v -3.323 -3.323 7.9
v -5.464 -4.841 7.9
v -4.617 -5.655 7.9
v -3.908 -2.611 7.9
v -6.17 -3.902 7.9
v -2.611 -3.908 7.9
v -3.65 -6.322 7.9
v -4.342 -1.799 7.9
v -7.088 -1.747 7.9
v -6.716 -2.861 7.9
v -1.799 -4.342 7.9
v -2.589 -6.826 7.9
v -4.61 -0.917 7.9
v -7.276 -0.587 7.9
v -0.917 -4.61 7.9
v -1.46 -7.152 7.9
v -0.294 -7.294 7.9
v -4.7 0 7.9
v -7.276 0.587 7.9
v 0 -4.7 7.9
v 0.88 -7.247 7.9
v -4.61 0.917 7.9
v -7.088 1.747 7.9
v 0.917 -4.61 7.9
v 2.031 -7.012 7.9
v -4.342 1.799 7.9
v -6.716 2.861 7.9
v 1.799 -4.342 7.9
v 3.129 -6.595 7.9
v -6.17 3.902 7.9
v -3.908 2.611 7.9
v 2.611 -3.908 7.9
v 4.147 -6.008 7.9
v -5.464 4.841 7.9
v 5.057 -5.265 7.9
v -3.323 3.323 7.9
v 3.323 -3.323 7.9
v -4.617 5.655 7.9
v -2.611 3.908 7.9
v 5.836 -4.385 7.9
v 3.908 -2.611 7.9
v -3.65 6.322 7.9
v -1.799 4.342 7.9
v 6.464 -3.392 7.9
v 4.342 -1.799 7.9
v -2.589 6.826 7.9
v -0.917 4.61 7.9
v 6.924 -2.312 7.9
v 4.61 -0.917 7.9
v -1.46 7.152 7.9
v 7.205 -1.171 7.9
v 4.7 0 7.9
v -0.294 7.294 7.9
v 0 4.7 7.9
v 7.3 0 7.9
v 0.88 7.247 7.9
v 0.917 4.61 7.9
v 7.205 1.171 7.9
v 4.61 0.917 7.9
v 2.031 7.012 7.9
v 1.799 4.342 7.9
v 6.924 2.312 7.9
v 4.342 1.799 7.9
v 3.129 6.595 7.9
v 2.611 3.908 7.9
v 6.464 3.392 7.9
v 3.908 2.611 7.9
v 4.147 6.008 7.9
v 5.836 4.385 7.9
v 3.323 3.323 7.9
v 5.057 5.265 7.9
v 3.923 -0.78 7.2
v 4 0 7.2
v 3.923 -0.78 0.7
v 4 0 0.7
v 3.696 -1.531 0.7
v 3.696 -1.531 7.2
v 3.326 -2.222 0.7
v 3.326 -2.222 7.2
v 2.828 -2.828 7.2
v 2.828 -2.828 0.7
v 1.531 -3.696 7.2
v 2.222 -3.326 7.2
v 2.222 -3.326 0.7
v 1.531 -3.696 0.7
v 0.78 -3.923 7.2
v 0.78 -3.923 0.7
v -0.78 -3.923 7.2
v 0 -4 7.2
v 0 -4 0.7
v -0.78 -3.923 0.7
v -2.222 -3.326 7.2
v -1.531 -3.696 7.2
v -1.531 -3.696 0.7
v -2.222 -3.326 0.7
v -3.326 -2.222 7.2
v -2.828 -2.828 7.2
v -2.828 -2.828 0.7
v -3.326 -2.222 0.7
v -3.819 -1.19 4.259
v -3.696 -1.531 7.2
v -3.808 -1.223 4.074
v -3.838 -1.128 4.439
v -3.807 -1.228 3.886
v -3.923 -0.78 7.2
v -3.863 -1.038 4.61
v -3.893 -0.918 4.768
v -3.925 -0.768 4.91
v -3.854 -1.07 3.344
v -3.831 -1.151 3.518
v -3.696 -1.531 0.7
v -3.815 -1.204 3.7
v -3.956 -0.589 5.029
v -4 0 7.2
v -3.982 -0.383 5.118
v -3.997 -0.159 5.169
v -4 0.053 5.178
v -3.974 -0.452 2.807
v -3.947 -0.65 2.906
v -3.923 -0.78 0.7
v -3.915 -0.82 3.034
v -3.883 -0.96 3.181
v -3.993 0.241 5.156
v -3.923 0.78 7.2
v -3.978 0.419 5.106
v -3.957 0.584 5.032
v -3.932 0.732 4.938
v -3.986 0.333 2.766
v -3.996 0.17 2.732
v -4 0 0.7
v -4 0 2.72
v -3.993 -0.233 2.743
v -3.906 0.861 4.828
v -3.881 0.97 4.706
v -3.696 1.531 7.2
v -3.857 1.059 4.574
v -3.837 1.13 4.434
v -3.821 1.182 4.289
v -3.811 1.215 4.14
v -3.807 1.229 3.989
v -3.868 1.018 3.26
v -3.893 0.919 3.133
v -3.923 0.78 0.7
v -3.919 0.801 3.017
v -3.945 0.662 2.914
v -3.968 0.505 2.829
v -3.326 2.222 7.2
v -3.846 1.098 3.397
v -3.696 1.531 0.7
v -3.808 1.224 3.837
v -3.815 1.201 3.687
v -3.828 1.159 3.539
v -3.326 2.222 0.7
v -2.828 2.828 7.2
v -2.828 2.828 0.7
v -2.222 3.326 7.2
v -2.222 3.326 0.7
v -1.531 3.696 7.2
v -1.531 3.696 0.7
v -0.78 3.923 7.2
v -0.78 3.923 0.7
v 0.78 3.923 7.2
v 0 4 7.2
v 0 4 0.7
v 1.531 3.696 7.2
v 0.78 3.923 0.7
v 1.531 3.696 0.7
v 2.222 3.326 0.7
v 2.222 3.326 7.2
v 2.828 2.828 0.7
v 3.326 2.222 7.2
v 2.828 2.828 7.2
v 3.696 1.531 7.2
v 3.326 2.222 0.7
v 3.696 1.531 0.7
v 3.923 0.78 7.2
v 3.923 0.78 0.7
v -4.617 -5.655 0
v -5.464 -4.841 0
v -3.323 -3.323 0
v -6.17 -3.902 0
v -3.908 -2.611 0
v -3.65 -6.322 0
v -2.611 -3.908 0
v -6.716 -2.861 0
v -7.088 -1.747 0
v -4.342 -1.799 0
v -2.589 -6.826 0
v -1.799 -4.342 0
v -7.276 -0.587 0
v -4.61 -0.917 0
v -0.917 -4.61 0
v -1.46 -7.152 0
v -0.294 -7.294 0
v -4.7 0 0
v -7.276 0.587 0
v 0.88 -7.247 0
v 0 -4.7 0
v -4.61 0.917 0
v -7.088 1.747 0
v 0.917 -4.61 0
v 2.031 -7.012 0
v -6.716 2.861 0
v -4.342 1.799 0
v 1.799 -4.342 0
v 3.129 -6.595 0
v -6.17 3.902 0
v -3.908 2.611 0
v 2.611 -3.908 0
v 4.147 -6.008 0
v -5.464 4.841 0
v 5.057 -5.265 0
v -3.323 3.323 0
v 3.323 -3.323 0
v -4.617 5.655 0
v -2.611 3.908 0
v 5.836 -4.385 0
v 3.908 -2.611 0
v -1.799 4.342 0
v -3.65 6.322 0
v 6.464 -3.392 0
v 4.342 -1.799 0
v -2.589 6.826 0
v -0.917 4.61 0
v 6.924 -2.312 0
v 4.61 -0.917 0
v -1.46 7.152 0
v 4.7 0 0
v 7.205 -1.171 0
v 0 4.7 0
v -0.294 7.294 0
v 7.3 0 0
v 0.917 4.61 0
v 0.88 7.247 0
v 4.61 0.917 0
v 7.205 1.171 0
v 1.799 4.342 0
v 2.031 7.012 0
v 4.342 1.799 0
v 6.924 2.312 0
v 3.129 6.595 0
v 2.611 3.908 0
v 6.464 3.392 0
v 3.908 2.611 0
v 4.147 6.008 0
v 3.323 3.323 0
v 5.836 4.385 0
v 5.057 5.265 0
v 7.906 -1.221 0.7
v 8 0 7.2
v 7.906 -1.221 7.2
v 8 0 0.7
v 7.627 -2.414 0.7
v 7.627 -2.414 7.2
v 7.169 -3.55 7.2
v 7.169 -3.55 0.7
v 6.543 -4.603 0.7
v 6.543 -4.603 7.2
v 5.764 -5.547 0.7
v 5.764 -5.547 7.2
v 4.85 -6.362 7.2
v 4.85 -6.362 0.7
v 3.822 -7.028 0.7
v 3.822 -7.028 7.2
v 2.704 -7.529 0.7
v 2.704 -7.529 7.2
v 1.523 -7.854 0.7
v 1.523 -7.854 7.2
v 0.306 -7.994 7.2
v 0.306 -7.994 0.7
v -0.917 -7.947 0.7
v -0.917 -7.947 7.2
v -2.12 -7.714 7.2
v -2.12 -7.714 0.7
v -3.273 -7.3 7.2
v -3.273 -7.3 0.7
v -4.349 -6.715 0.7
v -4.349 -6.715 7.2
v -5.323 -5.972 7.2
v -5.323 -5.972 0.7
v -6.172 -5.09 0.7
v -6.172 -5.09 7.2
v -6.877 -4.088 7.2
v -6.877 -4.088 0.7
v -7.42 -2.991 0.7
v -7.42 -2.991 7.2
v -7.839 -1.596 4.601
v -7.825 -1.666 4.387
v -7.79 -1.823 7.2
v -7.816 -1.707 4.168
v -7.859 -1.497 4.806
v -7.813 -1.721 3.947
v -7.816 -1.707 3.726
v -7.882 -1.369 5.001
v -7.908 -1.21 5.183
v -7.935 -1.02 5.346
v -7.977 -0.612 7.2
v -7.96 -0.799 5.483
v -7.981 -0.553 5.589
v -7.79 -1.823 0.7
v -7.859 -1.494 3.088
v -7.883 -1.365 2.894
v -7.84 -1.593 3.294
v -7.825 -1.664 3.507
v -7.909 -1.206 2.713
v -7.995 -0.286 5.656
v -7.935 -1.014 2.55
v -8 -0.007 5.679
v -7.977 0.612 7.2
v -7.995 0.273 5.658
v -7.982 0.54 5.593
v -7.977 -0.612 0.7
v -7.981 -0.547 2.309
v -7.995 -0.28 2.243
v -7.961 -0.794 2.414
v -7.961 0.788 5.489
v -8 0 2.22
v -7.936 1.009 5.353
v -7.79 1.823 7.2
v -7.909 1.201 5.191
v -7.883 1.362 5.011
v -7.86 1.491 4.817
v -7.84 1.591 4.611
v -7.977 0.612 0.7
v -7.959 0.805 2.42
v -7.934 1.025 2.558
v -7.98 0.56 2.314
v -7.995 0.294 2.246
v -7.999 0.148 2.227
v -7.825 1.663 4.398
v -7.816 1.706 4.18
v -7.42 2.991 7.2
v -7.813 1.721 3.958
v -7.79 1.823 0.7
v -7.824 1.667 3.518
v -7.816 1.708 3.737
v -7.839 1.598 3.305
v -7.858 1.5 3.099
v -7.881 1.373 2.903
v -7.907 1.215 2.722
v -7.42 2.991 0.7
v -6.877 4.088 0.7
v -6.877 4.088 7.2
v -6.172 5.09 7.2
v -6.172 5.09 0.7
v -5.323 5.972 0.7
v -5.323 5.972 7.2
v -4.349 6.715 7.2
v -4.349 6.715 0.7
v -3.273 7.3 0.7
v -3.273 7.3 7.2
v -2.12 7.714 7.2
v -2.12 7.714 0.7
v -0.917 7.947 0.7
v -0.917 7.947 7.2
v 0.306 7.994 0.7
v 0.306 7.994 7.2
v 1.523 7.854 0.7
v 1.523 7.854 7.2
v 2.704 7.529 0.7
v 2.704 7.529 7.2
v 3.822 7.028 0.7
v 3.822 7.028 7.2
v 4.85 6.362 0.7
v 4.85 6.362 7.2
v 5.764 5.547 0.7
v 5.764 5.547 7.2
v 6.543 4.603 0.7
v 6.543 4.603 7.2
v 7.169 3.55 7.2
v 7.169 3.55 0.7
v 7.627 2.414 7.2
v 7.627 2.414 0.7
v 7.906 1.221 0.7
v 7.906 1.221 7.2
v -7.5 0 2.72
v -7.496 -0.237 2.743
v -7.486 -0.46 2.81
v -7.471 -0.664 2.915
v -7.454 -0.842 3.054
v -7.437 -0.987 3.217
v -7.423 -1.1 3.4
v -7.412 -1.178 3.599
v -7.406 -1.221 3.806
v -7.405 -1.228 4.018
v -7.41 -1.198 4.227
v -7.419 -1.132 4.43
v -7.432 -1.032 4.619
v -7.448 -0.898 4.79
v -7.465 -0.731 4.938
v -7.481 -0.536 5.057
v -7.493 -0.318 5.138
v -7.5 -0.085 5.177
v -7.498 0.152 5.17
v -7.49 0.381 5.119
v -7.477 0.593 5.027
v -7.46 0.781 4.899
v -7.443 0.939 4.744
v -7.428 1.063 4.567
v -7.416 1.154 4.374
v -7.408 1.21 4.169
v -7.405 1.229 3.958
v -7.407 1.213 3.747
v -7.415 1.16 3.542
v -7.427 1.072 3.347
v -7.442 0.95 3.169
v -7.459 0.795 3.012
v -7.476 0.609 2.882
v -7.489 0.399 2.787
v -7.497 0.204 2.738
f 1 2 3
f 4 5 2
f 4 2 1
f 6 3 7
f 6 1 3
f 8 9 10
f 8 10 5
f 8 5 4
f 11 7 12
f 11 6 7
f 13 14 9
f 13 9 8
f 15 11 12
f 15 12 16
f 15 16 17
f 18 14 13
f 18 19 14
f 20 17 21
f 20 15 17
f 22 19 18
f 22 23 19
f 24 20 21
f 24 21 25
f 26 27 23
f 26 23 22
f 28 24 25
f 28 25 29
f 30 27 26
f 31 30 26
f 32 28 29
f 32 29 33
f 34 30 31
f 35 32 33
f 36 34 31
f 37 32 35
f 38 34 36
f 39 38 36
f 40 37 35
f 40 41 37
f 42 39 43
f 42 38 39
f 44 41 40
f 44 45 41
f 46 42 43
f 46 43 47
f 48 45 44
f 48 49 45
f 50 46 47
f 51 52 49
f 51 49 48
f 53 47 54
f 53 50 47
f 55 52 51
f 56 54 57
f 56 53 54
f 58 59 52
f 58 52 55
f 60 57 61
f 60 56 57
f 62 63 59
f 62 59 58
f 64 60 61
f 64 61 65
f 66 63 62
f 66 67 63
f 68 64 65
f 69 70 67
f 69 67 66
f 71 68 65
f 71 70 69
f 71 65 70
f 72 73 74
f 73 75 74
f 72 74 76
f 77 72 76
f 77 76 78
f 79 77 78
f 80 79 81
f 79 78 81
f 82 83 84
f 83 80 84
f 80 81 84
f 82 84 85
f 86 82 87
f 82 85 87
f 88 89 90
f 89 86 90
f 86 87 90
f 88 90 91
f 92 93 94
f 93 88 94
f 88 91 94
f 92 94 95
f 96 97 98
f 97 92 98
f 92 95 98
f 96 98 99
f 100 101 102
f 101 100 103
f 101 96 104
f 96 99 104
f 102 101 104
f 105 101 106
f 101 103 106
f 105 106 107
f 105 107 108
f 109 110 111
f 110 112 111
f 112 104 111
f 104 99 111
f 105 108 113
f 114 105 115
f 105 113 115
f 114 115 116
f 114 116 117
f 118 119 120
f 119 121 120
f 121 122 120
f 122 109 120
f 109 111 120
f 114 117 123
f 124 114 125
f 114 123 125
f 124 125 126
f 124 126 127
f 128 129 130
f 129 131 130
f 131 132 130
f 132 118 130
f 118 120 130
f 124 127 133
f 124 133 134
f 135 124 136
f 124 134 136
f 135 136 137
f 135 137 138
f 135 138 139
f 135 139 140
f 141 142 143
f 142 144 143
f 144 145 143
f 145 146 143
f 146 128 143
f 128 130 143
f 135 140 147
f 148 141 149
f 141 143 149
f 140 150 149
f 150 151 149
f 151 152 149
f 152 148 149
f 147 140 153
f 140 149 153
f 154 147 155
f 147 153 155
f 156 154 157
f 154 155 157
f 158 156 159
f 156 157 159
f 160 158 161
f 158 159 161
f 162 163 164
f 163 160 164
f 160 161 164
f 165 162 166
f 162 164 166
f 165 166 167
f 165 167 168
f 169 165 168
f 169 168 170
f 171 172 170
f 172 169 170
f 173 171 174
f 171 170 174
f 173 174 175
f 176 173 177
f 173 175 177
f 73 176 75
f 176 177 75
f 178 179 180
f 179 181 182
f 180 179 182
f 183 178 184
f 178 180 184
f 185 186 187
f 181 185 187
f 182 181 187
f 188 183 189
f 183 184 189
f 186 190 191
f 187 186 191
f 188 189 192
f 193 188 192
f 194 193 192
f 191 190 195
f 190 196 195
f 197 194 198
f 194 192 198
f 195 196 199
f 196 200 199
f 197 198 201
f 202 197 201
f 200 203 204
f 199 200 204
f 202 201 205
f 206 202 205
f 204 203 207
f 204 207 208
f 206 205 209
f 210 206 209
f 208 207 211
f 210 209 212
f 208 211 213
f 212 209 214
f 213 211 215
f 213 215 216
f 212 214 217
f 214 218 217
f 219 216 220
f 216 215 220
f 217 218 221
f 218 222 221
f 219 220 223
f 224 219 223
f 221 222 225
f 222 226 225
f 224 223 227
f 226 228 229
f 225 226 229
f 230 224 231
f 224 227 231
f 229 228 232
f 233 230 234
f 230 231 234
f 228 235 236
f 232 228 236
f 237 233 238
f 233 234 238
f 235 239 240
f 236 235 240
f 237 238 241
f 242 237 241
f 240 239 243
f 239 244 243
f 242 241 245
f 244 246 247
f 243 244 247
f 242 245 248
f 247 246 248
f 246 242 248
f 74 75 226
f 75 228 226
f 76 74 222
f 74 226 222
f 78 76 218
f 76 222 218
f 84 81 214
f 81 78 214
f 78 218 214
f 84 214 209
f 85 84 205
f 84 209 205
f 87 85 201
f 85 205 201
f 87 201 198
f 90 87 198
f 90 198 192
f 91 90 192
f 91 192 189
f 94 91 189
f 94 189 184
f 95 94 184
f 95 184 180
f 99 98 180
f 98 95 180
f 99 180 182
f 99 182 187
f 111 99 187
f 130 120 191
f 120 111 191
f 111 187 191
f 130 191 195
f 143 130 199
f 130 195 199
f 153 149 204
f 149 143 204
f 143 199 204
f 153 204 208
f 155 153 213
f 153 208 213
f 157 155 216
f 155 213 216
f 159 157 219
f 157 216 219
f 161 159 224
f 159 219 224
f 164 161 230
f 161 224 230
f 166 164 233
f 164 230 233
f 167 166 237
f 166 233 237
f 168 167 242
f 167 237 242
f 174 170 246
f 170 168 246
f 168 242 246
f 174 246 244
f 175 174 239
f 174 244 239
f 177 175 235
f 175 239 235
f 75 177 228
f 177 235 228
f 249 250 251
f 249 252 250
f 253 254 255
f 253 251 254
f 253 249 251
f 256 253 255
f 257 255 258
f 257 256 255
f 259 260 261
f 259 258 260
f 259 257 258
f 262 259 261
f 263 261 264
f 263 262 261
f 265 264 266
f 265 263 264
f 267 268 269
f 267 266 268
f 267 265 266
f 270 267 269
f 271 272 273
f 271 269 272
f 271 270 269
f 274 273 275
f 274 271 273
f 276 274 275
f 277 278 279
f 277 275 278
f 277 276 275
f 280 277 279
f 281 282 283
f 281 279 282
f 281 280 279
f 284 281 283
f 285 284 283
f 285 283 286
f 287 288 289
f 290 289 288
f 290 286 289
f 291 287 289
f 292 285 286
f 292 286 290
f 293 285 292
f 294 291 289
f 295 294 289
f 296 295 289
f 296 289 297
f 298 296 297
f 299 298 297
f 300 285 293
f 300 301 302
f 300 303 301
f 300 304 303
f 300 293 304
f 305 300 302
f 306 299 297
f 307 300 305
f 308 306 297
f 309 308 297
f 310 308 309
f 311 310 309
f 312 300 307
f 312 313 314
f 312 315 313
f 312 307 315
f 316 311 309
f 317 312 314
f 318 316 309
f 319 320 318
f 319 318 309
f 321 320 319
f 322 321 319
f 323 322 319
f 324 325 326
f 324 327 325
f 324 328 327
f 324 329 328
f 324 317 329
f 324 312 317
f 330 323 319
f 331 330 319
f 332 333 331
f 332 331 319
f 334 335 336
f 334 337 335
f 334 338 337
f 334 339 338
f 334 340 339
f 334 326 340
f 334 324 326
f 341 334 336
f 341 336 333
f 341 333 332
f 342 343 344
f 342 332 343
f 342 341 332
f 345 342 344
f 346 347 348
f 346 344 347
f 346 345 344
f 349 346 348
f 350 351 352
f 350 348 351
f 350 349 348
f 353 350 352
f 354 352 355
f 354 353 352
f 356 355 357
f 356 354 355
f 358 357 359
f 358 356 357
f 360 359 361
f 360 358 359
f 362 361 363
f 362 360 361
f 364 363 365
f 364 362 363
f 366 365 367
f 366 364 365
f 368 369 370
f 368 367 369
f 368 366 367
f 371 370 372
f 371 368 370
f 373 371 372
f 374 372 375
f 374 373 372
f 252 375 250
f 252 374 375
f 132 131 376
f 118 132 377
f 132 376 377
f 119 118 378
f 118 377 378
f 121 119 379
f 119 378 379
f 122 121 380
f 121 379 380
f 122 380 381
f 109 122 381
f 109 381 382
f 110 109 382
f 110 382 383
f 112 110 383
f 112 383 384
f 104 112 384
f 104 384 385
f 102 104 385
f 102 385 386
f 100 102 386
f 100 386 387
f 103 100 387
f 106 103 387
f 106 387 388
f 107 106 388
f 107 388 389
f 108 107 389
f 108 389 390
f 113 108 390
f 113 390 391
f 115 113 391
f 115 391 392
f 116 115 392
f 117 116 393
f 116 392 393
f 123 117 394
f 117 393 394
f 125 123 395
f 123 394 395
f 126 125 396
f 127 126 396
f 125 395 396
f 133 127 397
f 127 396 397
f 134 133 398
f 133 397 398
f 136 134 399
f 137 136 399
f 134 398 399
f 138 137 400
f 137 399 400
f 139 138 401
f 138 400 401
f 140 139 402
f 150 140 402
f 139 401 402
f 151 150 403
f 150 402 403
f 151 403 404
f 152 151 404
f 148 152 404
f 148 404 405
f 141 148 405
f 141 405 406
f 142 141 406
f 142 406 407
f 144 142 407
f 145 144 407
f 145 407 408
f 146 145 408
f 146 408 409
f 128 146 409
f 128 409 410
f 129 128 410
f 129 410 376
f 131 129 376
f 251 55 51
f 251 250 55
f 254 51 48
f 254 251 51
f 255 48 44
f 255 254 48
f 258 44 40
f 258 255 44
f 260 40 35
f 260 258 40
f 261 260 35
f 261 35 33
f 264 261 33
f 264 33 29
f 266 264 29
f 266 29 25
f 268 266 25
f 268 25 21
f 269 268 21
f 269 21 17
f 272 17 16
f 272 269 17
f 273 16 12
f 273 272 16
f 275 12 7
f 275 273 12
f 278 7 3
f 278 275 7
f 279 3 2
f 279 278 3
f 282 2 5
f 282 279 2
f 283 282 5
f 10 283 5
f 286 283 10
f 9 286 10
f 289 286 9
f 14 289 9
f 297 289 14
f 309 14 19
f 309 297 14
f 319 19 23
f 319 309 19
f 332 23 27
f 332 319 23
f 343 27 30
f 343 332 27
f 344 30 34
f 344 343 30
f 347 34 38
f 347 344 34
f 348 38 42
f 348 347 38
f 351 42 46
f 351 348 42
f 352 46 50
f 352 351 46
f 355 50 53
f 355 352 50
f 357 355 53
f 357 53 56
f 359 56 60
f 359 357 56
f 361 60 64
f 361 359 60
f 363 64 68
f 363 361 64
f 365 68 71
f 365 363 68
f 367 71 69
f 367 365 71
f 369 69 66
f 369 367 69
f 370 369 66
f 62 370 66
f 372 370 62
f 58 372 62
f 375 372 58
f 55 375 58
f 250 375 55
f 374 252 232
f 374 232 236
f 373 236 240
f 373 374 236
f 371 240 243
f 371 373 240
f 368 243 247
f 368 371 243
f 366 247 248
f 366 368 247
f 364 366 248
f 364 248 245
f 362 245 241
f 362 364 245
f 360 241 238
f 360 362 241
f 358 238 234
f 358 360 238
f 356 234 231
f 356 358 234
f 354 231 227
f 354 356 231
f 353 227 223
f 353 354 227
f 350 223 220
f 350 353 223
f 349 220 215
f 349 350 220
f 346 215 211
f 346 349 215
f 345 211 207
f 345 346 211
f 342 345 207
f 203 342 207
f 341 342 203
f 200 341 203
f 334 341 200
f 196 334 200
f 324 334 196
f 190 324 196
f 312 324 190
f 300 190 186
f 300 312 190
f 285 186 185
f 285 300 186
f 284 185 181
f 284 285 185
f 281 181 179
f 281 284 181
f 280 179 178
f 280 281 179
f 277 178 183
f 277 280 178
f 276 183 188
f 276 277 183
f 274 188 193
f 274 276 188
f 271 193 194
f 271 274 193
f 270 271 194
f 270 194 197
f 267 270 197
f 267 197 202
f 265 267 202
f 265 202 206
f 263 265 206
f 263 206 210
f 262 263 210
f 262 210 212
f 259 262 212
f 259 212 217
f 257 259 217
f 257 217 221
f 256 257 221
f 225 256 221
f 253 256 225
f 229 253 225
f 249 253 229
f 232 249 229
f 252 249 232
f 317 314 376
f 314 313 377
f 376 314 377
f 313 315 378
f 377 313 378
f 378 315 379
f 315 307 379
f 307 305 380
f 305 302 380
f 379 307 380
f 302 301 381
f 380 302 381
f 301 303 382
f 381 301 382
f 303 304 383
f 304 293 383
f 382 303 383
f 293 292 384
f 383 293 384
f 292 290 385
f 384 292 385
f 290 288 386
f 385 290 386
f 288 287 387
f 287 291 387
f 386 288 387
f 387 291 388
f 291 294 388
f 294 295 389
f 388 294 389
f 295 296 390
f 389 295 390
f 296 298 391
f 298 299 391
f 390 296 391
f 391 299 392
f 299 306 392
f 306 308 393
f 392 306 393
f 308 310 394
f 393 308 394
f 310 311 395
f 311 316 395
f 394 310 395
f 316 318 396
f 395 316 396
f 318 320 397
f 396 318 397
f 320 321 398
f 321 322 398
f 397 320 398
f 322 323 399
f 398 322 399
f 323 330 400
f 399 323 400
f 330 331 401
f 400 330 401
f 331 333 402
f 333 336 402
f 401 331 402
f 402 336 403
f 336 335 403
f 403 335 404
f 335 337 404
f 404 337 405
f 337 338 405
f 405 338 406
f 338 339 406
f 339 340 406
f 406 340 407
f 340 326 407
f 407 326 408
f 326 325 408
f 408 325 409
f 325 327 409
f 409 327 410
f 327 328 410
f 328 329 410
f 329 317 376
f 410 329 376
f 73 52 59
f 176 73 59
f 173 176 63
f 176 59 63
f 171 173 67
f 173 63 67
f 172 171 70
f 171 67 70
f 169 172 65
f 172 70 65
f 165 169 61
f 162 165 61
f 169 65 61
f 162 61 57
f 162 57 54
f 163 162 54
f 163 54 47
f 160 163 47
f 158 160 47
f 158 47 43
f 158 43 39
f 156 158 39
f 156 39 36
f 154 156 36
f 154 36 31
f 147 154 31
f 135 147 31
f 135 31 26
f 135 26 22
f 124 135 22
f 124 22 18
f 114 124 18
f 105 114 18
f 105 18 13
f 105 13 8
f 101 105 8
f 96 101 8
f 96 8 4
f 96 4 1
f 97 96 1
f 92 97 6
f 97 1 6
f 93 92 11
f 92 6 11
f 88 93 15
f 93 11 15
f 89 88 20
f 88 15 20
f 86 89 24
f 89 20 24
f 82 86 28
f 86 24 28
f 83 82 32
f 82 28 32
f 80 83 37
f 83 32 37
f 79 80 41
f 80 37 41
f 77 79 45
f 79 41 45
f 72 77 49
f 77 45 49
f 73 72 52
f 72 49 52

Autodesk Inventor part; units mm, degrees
ref_plane "YZ Plane" through (0, 0, 0) normal (1, 0, 0) x (0, 1, 0)
ref_plane "XZ Plane" through (0, 0, 0) normal (0, 1, 0) x (-1, 0, 0)
ref_plane "XY Plane" through (0, 0, 0) normal (0, 0, 1) x (1, 0, 0)
sketch "Sketch1" plane through (0, 0, 0) normal (0, 0, 1) x (1, 0, 0)
  circle A0 centre (0, 0) radius 8
  circle A1 centre (0, 0) radius 4
  dimension "d0" = 16
  dimension "d1" = 8
extrude "Extrusion1" add sketch "Sketch1" along normal blind 7.9
chamfer "Chamfer1" distance 0.7 angle 45 4 edges at (-8, 0, 0) (-8, 0, 7.9) (-4, 0, 0) (-4, 0, 7.9)
sketch "Sketch2" plane through (0, 0, 0) normal (1, 0, 0) x (0, 1, 0)
  line L0 (-4.7, 0) -> (4.7, 0) projected
  line L1 (4.7, 7.9) -> (-4.7, 7.9) projected
  point P0 (0, 0)
  point P1 (0, 3.95)
  point P2 (0, 0)
  dimension "d7" = 3.95
hole "Hole1" at (0, 0, 3.95) direction (-1, 0, 0) diameter 2.459 end through all thread size "M3x0.5" class "6H" standard "ISO Metric profile"
chamfer "Chamfer2" distance 0.5 angle 45 1 edges at (-8, 0.0002, 5.1795)
properties part number "askraag 8mm" material "Stainless Steel"
